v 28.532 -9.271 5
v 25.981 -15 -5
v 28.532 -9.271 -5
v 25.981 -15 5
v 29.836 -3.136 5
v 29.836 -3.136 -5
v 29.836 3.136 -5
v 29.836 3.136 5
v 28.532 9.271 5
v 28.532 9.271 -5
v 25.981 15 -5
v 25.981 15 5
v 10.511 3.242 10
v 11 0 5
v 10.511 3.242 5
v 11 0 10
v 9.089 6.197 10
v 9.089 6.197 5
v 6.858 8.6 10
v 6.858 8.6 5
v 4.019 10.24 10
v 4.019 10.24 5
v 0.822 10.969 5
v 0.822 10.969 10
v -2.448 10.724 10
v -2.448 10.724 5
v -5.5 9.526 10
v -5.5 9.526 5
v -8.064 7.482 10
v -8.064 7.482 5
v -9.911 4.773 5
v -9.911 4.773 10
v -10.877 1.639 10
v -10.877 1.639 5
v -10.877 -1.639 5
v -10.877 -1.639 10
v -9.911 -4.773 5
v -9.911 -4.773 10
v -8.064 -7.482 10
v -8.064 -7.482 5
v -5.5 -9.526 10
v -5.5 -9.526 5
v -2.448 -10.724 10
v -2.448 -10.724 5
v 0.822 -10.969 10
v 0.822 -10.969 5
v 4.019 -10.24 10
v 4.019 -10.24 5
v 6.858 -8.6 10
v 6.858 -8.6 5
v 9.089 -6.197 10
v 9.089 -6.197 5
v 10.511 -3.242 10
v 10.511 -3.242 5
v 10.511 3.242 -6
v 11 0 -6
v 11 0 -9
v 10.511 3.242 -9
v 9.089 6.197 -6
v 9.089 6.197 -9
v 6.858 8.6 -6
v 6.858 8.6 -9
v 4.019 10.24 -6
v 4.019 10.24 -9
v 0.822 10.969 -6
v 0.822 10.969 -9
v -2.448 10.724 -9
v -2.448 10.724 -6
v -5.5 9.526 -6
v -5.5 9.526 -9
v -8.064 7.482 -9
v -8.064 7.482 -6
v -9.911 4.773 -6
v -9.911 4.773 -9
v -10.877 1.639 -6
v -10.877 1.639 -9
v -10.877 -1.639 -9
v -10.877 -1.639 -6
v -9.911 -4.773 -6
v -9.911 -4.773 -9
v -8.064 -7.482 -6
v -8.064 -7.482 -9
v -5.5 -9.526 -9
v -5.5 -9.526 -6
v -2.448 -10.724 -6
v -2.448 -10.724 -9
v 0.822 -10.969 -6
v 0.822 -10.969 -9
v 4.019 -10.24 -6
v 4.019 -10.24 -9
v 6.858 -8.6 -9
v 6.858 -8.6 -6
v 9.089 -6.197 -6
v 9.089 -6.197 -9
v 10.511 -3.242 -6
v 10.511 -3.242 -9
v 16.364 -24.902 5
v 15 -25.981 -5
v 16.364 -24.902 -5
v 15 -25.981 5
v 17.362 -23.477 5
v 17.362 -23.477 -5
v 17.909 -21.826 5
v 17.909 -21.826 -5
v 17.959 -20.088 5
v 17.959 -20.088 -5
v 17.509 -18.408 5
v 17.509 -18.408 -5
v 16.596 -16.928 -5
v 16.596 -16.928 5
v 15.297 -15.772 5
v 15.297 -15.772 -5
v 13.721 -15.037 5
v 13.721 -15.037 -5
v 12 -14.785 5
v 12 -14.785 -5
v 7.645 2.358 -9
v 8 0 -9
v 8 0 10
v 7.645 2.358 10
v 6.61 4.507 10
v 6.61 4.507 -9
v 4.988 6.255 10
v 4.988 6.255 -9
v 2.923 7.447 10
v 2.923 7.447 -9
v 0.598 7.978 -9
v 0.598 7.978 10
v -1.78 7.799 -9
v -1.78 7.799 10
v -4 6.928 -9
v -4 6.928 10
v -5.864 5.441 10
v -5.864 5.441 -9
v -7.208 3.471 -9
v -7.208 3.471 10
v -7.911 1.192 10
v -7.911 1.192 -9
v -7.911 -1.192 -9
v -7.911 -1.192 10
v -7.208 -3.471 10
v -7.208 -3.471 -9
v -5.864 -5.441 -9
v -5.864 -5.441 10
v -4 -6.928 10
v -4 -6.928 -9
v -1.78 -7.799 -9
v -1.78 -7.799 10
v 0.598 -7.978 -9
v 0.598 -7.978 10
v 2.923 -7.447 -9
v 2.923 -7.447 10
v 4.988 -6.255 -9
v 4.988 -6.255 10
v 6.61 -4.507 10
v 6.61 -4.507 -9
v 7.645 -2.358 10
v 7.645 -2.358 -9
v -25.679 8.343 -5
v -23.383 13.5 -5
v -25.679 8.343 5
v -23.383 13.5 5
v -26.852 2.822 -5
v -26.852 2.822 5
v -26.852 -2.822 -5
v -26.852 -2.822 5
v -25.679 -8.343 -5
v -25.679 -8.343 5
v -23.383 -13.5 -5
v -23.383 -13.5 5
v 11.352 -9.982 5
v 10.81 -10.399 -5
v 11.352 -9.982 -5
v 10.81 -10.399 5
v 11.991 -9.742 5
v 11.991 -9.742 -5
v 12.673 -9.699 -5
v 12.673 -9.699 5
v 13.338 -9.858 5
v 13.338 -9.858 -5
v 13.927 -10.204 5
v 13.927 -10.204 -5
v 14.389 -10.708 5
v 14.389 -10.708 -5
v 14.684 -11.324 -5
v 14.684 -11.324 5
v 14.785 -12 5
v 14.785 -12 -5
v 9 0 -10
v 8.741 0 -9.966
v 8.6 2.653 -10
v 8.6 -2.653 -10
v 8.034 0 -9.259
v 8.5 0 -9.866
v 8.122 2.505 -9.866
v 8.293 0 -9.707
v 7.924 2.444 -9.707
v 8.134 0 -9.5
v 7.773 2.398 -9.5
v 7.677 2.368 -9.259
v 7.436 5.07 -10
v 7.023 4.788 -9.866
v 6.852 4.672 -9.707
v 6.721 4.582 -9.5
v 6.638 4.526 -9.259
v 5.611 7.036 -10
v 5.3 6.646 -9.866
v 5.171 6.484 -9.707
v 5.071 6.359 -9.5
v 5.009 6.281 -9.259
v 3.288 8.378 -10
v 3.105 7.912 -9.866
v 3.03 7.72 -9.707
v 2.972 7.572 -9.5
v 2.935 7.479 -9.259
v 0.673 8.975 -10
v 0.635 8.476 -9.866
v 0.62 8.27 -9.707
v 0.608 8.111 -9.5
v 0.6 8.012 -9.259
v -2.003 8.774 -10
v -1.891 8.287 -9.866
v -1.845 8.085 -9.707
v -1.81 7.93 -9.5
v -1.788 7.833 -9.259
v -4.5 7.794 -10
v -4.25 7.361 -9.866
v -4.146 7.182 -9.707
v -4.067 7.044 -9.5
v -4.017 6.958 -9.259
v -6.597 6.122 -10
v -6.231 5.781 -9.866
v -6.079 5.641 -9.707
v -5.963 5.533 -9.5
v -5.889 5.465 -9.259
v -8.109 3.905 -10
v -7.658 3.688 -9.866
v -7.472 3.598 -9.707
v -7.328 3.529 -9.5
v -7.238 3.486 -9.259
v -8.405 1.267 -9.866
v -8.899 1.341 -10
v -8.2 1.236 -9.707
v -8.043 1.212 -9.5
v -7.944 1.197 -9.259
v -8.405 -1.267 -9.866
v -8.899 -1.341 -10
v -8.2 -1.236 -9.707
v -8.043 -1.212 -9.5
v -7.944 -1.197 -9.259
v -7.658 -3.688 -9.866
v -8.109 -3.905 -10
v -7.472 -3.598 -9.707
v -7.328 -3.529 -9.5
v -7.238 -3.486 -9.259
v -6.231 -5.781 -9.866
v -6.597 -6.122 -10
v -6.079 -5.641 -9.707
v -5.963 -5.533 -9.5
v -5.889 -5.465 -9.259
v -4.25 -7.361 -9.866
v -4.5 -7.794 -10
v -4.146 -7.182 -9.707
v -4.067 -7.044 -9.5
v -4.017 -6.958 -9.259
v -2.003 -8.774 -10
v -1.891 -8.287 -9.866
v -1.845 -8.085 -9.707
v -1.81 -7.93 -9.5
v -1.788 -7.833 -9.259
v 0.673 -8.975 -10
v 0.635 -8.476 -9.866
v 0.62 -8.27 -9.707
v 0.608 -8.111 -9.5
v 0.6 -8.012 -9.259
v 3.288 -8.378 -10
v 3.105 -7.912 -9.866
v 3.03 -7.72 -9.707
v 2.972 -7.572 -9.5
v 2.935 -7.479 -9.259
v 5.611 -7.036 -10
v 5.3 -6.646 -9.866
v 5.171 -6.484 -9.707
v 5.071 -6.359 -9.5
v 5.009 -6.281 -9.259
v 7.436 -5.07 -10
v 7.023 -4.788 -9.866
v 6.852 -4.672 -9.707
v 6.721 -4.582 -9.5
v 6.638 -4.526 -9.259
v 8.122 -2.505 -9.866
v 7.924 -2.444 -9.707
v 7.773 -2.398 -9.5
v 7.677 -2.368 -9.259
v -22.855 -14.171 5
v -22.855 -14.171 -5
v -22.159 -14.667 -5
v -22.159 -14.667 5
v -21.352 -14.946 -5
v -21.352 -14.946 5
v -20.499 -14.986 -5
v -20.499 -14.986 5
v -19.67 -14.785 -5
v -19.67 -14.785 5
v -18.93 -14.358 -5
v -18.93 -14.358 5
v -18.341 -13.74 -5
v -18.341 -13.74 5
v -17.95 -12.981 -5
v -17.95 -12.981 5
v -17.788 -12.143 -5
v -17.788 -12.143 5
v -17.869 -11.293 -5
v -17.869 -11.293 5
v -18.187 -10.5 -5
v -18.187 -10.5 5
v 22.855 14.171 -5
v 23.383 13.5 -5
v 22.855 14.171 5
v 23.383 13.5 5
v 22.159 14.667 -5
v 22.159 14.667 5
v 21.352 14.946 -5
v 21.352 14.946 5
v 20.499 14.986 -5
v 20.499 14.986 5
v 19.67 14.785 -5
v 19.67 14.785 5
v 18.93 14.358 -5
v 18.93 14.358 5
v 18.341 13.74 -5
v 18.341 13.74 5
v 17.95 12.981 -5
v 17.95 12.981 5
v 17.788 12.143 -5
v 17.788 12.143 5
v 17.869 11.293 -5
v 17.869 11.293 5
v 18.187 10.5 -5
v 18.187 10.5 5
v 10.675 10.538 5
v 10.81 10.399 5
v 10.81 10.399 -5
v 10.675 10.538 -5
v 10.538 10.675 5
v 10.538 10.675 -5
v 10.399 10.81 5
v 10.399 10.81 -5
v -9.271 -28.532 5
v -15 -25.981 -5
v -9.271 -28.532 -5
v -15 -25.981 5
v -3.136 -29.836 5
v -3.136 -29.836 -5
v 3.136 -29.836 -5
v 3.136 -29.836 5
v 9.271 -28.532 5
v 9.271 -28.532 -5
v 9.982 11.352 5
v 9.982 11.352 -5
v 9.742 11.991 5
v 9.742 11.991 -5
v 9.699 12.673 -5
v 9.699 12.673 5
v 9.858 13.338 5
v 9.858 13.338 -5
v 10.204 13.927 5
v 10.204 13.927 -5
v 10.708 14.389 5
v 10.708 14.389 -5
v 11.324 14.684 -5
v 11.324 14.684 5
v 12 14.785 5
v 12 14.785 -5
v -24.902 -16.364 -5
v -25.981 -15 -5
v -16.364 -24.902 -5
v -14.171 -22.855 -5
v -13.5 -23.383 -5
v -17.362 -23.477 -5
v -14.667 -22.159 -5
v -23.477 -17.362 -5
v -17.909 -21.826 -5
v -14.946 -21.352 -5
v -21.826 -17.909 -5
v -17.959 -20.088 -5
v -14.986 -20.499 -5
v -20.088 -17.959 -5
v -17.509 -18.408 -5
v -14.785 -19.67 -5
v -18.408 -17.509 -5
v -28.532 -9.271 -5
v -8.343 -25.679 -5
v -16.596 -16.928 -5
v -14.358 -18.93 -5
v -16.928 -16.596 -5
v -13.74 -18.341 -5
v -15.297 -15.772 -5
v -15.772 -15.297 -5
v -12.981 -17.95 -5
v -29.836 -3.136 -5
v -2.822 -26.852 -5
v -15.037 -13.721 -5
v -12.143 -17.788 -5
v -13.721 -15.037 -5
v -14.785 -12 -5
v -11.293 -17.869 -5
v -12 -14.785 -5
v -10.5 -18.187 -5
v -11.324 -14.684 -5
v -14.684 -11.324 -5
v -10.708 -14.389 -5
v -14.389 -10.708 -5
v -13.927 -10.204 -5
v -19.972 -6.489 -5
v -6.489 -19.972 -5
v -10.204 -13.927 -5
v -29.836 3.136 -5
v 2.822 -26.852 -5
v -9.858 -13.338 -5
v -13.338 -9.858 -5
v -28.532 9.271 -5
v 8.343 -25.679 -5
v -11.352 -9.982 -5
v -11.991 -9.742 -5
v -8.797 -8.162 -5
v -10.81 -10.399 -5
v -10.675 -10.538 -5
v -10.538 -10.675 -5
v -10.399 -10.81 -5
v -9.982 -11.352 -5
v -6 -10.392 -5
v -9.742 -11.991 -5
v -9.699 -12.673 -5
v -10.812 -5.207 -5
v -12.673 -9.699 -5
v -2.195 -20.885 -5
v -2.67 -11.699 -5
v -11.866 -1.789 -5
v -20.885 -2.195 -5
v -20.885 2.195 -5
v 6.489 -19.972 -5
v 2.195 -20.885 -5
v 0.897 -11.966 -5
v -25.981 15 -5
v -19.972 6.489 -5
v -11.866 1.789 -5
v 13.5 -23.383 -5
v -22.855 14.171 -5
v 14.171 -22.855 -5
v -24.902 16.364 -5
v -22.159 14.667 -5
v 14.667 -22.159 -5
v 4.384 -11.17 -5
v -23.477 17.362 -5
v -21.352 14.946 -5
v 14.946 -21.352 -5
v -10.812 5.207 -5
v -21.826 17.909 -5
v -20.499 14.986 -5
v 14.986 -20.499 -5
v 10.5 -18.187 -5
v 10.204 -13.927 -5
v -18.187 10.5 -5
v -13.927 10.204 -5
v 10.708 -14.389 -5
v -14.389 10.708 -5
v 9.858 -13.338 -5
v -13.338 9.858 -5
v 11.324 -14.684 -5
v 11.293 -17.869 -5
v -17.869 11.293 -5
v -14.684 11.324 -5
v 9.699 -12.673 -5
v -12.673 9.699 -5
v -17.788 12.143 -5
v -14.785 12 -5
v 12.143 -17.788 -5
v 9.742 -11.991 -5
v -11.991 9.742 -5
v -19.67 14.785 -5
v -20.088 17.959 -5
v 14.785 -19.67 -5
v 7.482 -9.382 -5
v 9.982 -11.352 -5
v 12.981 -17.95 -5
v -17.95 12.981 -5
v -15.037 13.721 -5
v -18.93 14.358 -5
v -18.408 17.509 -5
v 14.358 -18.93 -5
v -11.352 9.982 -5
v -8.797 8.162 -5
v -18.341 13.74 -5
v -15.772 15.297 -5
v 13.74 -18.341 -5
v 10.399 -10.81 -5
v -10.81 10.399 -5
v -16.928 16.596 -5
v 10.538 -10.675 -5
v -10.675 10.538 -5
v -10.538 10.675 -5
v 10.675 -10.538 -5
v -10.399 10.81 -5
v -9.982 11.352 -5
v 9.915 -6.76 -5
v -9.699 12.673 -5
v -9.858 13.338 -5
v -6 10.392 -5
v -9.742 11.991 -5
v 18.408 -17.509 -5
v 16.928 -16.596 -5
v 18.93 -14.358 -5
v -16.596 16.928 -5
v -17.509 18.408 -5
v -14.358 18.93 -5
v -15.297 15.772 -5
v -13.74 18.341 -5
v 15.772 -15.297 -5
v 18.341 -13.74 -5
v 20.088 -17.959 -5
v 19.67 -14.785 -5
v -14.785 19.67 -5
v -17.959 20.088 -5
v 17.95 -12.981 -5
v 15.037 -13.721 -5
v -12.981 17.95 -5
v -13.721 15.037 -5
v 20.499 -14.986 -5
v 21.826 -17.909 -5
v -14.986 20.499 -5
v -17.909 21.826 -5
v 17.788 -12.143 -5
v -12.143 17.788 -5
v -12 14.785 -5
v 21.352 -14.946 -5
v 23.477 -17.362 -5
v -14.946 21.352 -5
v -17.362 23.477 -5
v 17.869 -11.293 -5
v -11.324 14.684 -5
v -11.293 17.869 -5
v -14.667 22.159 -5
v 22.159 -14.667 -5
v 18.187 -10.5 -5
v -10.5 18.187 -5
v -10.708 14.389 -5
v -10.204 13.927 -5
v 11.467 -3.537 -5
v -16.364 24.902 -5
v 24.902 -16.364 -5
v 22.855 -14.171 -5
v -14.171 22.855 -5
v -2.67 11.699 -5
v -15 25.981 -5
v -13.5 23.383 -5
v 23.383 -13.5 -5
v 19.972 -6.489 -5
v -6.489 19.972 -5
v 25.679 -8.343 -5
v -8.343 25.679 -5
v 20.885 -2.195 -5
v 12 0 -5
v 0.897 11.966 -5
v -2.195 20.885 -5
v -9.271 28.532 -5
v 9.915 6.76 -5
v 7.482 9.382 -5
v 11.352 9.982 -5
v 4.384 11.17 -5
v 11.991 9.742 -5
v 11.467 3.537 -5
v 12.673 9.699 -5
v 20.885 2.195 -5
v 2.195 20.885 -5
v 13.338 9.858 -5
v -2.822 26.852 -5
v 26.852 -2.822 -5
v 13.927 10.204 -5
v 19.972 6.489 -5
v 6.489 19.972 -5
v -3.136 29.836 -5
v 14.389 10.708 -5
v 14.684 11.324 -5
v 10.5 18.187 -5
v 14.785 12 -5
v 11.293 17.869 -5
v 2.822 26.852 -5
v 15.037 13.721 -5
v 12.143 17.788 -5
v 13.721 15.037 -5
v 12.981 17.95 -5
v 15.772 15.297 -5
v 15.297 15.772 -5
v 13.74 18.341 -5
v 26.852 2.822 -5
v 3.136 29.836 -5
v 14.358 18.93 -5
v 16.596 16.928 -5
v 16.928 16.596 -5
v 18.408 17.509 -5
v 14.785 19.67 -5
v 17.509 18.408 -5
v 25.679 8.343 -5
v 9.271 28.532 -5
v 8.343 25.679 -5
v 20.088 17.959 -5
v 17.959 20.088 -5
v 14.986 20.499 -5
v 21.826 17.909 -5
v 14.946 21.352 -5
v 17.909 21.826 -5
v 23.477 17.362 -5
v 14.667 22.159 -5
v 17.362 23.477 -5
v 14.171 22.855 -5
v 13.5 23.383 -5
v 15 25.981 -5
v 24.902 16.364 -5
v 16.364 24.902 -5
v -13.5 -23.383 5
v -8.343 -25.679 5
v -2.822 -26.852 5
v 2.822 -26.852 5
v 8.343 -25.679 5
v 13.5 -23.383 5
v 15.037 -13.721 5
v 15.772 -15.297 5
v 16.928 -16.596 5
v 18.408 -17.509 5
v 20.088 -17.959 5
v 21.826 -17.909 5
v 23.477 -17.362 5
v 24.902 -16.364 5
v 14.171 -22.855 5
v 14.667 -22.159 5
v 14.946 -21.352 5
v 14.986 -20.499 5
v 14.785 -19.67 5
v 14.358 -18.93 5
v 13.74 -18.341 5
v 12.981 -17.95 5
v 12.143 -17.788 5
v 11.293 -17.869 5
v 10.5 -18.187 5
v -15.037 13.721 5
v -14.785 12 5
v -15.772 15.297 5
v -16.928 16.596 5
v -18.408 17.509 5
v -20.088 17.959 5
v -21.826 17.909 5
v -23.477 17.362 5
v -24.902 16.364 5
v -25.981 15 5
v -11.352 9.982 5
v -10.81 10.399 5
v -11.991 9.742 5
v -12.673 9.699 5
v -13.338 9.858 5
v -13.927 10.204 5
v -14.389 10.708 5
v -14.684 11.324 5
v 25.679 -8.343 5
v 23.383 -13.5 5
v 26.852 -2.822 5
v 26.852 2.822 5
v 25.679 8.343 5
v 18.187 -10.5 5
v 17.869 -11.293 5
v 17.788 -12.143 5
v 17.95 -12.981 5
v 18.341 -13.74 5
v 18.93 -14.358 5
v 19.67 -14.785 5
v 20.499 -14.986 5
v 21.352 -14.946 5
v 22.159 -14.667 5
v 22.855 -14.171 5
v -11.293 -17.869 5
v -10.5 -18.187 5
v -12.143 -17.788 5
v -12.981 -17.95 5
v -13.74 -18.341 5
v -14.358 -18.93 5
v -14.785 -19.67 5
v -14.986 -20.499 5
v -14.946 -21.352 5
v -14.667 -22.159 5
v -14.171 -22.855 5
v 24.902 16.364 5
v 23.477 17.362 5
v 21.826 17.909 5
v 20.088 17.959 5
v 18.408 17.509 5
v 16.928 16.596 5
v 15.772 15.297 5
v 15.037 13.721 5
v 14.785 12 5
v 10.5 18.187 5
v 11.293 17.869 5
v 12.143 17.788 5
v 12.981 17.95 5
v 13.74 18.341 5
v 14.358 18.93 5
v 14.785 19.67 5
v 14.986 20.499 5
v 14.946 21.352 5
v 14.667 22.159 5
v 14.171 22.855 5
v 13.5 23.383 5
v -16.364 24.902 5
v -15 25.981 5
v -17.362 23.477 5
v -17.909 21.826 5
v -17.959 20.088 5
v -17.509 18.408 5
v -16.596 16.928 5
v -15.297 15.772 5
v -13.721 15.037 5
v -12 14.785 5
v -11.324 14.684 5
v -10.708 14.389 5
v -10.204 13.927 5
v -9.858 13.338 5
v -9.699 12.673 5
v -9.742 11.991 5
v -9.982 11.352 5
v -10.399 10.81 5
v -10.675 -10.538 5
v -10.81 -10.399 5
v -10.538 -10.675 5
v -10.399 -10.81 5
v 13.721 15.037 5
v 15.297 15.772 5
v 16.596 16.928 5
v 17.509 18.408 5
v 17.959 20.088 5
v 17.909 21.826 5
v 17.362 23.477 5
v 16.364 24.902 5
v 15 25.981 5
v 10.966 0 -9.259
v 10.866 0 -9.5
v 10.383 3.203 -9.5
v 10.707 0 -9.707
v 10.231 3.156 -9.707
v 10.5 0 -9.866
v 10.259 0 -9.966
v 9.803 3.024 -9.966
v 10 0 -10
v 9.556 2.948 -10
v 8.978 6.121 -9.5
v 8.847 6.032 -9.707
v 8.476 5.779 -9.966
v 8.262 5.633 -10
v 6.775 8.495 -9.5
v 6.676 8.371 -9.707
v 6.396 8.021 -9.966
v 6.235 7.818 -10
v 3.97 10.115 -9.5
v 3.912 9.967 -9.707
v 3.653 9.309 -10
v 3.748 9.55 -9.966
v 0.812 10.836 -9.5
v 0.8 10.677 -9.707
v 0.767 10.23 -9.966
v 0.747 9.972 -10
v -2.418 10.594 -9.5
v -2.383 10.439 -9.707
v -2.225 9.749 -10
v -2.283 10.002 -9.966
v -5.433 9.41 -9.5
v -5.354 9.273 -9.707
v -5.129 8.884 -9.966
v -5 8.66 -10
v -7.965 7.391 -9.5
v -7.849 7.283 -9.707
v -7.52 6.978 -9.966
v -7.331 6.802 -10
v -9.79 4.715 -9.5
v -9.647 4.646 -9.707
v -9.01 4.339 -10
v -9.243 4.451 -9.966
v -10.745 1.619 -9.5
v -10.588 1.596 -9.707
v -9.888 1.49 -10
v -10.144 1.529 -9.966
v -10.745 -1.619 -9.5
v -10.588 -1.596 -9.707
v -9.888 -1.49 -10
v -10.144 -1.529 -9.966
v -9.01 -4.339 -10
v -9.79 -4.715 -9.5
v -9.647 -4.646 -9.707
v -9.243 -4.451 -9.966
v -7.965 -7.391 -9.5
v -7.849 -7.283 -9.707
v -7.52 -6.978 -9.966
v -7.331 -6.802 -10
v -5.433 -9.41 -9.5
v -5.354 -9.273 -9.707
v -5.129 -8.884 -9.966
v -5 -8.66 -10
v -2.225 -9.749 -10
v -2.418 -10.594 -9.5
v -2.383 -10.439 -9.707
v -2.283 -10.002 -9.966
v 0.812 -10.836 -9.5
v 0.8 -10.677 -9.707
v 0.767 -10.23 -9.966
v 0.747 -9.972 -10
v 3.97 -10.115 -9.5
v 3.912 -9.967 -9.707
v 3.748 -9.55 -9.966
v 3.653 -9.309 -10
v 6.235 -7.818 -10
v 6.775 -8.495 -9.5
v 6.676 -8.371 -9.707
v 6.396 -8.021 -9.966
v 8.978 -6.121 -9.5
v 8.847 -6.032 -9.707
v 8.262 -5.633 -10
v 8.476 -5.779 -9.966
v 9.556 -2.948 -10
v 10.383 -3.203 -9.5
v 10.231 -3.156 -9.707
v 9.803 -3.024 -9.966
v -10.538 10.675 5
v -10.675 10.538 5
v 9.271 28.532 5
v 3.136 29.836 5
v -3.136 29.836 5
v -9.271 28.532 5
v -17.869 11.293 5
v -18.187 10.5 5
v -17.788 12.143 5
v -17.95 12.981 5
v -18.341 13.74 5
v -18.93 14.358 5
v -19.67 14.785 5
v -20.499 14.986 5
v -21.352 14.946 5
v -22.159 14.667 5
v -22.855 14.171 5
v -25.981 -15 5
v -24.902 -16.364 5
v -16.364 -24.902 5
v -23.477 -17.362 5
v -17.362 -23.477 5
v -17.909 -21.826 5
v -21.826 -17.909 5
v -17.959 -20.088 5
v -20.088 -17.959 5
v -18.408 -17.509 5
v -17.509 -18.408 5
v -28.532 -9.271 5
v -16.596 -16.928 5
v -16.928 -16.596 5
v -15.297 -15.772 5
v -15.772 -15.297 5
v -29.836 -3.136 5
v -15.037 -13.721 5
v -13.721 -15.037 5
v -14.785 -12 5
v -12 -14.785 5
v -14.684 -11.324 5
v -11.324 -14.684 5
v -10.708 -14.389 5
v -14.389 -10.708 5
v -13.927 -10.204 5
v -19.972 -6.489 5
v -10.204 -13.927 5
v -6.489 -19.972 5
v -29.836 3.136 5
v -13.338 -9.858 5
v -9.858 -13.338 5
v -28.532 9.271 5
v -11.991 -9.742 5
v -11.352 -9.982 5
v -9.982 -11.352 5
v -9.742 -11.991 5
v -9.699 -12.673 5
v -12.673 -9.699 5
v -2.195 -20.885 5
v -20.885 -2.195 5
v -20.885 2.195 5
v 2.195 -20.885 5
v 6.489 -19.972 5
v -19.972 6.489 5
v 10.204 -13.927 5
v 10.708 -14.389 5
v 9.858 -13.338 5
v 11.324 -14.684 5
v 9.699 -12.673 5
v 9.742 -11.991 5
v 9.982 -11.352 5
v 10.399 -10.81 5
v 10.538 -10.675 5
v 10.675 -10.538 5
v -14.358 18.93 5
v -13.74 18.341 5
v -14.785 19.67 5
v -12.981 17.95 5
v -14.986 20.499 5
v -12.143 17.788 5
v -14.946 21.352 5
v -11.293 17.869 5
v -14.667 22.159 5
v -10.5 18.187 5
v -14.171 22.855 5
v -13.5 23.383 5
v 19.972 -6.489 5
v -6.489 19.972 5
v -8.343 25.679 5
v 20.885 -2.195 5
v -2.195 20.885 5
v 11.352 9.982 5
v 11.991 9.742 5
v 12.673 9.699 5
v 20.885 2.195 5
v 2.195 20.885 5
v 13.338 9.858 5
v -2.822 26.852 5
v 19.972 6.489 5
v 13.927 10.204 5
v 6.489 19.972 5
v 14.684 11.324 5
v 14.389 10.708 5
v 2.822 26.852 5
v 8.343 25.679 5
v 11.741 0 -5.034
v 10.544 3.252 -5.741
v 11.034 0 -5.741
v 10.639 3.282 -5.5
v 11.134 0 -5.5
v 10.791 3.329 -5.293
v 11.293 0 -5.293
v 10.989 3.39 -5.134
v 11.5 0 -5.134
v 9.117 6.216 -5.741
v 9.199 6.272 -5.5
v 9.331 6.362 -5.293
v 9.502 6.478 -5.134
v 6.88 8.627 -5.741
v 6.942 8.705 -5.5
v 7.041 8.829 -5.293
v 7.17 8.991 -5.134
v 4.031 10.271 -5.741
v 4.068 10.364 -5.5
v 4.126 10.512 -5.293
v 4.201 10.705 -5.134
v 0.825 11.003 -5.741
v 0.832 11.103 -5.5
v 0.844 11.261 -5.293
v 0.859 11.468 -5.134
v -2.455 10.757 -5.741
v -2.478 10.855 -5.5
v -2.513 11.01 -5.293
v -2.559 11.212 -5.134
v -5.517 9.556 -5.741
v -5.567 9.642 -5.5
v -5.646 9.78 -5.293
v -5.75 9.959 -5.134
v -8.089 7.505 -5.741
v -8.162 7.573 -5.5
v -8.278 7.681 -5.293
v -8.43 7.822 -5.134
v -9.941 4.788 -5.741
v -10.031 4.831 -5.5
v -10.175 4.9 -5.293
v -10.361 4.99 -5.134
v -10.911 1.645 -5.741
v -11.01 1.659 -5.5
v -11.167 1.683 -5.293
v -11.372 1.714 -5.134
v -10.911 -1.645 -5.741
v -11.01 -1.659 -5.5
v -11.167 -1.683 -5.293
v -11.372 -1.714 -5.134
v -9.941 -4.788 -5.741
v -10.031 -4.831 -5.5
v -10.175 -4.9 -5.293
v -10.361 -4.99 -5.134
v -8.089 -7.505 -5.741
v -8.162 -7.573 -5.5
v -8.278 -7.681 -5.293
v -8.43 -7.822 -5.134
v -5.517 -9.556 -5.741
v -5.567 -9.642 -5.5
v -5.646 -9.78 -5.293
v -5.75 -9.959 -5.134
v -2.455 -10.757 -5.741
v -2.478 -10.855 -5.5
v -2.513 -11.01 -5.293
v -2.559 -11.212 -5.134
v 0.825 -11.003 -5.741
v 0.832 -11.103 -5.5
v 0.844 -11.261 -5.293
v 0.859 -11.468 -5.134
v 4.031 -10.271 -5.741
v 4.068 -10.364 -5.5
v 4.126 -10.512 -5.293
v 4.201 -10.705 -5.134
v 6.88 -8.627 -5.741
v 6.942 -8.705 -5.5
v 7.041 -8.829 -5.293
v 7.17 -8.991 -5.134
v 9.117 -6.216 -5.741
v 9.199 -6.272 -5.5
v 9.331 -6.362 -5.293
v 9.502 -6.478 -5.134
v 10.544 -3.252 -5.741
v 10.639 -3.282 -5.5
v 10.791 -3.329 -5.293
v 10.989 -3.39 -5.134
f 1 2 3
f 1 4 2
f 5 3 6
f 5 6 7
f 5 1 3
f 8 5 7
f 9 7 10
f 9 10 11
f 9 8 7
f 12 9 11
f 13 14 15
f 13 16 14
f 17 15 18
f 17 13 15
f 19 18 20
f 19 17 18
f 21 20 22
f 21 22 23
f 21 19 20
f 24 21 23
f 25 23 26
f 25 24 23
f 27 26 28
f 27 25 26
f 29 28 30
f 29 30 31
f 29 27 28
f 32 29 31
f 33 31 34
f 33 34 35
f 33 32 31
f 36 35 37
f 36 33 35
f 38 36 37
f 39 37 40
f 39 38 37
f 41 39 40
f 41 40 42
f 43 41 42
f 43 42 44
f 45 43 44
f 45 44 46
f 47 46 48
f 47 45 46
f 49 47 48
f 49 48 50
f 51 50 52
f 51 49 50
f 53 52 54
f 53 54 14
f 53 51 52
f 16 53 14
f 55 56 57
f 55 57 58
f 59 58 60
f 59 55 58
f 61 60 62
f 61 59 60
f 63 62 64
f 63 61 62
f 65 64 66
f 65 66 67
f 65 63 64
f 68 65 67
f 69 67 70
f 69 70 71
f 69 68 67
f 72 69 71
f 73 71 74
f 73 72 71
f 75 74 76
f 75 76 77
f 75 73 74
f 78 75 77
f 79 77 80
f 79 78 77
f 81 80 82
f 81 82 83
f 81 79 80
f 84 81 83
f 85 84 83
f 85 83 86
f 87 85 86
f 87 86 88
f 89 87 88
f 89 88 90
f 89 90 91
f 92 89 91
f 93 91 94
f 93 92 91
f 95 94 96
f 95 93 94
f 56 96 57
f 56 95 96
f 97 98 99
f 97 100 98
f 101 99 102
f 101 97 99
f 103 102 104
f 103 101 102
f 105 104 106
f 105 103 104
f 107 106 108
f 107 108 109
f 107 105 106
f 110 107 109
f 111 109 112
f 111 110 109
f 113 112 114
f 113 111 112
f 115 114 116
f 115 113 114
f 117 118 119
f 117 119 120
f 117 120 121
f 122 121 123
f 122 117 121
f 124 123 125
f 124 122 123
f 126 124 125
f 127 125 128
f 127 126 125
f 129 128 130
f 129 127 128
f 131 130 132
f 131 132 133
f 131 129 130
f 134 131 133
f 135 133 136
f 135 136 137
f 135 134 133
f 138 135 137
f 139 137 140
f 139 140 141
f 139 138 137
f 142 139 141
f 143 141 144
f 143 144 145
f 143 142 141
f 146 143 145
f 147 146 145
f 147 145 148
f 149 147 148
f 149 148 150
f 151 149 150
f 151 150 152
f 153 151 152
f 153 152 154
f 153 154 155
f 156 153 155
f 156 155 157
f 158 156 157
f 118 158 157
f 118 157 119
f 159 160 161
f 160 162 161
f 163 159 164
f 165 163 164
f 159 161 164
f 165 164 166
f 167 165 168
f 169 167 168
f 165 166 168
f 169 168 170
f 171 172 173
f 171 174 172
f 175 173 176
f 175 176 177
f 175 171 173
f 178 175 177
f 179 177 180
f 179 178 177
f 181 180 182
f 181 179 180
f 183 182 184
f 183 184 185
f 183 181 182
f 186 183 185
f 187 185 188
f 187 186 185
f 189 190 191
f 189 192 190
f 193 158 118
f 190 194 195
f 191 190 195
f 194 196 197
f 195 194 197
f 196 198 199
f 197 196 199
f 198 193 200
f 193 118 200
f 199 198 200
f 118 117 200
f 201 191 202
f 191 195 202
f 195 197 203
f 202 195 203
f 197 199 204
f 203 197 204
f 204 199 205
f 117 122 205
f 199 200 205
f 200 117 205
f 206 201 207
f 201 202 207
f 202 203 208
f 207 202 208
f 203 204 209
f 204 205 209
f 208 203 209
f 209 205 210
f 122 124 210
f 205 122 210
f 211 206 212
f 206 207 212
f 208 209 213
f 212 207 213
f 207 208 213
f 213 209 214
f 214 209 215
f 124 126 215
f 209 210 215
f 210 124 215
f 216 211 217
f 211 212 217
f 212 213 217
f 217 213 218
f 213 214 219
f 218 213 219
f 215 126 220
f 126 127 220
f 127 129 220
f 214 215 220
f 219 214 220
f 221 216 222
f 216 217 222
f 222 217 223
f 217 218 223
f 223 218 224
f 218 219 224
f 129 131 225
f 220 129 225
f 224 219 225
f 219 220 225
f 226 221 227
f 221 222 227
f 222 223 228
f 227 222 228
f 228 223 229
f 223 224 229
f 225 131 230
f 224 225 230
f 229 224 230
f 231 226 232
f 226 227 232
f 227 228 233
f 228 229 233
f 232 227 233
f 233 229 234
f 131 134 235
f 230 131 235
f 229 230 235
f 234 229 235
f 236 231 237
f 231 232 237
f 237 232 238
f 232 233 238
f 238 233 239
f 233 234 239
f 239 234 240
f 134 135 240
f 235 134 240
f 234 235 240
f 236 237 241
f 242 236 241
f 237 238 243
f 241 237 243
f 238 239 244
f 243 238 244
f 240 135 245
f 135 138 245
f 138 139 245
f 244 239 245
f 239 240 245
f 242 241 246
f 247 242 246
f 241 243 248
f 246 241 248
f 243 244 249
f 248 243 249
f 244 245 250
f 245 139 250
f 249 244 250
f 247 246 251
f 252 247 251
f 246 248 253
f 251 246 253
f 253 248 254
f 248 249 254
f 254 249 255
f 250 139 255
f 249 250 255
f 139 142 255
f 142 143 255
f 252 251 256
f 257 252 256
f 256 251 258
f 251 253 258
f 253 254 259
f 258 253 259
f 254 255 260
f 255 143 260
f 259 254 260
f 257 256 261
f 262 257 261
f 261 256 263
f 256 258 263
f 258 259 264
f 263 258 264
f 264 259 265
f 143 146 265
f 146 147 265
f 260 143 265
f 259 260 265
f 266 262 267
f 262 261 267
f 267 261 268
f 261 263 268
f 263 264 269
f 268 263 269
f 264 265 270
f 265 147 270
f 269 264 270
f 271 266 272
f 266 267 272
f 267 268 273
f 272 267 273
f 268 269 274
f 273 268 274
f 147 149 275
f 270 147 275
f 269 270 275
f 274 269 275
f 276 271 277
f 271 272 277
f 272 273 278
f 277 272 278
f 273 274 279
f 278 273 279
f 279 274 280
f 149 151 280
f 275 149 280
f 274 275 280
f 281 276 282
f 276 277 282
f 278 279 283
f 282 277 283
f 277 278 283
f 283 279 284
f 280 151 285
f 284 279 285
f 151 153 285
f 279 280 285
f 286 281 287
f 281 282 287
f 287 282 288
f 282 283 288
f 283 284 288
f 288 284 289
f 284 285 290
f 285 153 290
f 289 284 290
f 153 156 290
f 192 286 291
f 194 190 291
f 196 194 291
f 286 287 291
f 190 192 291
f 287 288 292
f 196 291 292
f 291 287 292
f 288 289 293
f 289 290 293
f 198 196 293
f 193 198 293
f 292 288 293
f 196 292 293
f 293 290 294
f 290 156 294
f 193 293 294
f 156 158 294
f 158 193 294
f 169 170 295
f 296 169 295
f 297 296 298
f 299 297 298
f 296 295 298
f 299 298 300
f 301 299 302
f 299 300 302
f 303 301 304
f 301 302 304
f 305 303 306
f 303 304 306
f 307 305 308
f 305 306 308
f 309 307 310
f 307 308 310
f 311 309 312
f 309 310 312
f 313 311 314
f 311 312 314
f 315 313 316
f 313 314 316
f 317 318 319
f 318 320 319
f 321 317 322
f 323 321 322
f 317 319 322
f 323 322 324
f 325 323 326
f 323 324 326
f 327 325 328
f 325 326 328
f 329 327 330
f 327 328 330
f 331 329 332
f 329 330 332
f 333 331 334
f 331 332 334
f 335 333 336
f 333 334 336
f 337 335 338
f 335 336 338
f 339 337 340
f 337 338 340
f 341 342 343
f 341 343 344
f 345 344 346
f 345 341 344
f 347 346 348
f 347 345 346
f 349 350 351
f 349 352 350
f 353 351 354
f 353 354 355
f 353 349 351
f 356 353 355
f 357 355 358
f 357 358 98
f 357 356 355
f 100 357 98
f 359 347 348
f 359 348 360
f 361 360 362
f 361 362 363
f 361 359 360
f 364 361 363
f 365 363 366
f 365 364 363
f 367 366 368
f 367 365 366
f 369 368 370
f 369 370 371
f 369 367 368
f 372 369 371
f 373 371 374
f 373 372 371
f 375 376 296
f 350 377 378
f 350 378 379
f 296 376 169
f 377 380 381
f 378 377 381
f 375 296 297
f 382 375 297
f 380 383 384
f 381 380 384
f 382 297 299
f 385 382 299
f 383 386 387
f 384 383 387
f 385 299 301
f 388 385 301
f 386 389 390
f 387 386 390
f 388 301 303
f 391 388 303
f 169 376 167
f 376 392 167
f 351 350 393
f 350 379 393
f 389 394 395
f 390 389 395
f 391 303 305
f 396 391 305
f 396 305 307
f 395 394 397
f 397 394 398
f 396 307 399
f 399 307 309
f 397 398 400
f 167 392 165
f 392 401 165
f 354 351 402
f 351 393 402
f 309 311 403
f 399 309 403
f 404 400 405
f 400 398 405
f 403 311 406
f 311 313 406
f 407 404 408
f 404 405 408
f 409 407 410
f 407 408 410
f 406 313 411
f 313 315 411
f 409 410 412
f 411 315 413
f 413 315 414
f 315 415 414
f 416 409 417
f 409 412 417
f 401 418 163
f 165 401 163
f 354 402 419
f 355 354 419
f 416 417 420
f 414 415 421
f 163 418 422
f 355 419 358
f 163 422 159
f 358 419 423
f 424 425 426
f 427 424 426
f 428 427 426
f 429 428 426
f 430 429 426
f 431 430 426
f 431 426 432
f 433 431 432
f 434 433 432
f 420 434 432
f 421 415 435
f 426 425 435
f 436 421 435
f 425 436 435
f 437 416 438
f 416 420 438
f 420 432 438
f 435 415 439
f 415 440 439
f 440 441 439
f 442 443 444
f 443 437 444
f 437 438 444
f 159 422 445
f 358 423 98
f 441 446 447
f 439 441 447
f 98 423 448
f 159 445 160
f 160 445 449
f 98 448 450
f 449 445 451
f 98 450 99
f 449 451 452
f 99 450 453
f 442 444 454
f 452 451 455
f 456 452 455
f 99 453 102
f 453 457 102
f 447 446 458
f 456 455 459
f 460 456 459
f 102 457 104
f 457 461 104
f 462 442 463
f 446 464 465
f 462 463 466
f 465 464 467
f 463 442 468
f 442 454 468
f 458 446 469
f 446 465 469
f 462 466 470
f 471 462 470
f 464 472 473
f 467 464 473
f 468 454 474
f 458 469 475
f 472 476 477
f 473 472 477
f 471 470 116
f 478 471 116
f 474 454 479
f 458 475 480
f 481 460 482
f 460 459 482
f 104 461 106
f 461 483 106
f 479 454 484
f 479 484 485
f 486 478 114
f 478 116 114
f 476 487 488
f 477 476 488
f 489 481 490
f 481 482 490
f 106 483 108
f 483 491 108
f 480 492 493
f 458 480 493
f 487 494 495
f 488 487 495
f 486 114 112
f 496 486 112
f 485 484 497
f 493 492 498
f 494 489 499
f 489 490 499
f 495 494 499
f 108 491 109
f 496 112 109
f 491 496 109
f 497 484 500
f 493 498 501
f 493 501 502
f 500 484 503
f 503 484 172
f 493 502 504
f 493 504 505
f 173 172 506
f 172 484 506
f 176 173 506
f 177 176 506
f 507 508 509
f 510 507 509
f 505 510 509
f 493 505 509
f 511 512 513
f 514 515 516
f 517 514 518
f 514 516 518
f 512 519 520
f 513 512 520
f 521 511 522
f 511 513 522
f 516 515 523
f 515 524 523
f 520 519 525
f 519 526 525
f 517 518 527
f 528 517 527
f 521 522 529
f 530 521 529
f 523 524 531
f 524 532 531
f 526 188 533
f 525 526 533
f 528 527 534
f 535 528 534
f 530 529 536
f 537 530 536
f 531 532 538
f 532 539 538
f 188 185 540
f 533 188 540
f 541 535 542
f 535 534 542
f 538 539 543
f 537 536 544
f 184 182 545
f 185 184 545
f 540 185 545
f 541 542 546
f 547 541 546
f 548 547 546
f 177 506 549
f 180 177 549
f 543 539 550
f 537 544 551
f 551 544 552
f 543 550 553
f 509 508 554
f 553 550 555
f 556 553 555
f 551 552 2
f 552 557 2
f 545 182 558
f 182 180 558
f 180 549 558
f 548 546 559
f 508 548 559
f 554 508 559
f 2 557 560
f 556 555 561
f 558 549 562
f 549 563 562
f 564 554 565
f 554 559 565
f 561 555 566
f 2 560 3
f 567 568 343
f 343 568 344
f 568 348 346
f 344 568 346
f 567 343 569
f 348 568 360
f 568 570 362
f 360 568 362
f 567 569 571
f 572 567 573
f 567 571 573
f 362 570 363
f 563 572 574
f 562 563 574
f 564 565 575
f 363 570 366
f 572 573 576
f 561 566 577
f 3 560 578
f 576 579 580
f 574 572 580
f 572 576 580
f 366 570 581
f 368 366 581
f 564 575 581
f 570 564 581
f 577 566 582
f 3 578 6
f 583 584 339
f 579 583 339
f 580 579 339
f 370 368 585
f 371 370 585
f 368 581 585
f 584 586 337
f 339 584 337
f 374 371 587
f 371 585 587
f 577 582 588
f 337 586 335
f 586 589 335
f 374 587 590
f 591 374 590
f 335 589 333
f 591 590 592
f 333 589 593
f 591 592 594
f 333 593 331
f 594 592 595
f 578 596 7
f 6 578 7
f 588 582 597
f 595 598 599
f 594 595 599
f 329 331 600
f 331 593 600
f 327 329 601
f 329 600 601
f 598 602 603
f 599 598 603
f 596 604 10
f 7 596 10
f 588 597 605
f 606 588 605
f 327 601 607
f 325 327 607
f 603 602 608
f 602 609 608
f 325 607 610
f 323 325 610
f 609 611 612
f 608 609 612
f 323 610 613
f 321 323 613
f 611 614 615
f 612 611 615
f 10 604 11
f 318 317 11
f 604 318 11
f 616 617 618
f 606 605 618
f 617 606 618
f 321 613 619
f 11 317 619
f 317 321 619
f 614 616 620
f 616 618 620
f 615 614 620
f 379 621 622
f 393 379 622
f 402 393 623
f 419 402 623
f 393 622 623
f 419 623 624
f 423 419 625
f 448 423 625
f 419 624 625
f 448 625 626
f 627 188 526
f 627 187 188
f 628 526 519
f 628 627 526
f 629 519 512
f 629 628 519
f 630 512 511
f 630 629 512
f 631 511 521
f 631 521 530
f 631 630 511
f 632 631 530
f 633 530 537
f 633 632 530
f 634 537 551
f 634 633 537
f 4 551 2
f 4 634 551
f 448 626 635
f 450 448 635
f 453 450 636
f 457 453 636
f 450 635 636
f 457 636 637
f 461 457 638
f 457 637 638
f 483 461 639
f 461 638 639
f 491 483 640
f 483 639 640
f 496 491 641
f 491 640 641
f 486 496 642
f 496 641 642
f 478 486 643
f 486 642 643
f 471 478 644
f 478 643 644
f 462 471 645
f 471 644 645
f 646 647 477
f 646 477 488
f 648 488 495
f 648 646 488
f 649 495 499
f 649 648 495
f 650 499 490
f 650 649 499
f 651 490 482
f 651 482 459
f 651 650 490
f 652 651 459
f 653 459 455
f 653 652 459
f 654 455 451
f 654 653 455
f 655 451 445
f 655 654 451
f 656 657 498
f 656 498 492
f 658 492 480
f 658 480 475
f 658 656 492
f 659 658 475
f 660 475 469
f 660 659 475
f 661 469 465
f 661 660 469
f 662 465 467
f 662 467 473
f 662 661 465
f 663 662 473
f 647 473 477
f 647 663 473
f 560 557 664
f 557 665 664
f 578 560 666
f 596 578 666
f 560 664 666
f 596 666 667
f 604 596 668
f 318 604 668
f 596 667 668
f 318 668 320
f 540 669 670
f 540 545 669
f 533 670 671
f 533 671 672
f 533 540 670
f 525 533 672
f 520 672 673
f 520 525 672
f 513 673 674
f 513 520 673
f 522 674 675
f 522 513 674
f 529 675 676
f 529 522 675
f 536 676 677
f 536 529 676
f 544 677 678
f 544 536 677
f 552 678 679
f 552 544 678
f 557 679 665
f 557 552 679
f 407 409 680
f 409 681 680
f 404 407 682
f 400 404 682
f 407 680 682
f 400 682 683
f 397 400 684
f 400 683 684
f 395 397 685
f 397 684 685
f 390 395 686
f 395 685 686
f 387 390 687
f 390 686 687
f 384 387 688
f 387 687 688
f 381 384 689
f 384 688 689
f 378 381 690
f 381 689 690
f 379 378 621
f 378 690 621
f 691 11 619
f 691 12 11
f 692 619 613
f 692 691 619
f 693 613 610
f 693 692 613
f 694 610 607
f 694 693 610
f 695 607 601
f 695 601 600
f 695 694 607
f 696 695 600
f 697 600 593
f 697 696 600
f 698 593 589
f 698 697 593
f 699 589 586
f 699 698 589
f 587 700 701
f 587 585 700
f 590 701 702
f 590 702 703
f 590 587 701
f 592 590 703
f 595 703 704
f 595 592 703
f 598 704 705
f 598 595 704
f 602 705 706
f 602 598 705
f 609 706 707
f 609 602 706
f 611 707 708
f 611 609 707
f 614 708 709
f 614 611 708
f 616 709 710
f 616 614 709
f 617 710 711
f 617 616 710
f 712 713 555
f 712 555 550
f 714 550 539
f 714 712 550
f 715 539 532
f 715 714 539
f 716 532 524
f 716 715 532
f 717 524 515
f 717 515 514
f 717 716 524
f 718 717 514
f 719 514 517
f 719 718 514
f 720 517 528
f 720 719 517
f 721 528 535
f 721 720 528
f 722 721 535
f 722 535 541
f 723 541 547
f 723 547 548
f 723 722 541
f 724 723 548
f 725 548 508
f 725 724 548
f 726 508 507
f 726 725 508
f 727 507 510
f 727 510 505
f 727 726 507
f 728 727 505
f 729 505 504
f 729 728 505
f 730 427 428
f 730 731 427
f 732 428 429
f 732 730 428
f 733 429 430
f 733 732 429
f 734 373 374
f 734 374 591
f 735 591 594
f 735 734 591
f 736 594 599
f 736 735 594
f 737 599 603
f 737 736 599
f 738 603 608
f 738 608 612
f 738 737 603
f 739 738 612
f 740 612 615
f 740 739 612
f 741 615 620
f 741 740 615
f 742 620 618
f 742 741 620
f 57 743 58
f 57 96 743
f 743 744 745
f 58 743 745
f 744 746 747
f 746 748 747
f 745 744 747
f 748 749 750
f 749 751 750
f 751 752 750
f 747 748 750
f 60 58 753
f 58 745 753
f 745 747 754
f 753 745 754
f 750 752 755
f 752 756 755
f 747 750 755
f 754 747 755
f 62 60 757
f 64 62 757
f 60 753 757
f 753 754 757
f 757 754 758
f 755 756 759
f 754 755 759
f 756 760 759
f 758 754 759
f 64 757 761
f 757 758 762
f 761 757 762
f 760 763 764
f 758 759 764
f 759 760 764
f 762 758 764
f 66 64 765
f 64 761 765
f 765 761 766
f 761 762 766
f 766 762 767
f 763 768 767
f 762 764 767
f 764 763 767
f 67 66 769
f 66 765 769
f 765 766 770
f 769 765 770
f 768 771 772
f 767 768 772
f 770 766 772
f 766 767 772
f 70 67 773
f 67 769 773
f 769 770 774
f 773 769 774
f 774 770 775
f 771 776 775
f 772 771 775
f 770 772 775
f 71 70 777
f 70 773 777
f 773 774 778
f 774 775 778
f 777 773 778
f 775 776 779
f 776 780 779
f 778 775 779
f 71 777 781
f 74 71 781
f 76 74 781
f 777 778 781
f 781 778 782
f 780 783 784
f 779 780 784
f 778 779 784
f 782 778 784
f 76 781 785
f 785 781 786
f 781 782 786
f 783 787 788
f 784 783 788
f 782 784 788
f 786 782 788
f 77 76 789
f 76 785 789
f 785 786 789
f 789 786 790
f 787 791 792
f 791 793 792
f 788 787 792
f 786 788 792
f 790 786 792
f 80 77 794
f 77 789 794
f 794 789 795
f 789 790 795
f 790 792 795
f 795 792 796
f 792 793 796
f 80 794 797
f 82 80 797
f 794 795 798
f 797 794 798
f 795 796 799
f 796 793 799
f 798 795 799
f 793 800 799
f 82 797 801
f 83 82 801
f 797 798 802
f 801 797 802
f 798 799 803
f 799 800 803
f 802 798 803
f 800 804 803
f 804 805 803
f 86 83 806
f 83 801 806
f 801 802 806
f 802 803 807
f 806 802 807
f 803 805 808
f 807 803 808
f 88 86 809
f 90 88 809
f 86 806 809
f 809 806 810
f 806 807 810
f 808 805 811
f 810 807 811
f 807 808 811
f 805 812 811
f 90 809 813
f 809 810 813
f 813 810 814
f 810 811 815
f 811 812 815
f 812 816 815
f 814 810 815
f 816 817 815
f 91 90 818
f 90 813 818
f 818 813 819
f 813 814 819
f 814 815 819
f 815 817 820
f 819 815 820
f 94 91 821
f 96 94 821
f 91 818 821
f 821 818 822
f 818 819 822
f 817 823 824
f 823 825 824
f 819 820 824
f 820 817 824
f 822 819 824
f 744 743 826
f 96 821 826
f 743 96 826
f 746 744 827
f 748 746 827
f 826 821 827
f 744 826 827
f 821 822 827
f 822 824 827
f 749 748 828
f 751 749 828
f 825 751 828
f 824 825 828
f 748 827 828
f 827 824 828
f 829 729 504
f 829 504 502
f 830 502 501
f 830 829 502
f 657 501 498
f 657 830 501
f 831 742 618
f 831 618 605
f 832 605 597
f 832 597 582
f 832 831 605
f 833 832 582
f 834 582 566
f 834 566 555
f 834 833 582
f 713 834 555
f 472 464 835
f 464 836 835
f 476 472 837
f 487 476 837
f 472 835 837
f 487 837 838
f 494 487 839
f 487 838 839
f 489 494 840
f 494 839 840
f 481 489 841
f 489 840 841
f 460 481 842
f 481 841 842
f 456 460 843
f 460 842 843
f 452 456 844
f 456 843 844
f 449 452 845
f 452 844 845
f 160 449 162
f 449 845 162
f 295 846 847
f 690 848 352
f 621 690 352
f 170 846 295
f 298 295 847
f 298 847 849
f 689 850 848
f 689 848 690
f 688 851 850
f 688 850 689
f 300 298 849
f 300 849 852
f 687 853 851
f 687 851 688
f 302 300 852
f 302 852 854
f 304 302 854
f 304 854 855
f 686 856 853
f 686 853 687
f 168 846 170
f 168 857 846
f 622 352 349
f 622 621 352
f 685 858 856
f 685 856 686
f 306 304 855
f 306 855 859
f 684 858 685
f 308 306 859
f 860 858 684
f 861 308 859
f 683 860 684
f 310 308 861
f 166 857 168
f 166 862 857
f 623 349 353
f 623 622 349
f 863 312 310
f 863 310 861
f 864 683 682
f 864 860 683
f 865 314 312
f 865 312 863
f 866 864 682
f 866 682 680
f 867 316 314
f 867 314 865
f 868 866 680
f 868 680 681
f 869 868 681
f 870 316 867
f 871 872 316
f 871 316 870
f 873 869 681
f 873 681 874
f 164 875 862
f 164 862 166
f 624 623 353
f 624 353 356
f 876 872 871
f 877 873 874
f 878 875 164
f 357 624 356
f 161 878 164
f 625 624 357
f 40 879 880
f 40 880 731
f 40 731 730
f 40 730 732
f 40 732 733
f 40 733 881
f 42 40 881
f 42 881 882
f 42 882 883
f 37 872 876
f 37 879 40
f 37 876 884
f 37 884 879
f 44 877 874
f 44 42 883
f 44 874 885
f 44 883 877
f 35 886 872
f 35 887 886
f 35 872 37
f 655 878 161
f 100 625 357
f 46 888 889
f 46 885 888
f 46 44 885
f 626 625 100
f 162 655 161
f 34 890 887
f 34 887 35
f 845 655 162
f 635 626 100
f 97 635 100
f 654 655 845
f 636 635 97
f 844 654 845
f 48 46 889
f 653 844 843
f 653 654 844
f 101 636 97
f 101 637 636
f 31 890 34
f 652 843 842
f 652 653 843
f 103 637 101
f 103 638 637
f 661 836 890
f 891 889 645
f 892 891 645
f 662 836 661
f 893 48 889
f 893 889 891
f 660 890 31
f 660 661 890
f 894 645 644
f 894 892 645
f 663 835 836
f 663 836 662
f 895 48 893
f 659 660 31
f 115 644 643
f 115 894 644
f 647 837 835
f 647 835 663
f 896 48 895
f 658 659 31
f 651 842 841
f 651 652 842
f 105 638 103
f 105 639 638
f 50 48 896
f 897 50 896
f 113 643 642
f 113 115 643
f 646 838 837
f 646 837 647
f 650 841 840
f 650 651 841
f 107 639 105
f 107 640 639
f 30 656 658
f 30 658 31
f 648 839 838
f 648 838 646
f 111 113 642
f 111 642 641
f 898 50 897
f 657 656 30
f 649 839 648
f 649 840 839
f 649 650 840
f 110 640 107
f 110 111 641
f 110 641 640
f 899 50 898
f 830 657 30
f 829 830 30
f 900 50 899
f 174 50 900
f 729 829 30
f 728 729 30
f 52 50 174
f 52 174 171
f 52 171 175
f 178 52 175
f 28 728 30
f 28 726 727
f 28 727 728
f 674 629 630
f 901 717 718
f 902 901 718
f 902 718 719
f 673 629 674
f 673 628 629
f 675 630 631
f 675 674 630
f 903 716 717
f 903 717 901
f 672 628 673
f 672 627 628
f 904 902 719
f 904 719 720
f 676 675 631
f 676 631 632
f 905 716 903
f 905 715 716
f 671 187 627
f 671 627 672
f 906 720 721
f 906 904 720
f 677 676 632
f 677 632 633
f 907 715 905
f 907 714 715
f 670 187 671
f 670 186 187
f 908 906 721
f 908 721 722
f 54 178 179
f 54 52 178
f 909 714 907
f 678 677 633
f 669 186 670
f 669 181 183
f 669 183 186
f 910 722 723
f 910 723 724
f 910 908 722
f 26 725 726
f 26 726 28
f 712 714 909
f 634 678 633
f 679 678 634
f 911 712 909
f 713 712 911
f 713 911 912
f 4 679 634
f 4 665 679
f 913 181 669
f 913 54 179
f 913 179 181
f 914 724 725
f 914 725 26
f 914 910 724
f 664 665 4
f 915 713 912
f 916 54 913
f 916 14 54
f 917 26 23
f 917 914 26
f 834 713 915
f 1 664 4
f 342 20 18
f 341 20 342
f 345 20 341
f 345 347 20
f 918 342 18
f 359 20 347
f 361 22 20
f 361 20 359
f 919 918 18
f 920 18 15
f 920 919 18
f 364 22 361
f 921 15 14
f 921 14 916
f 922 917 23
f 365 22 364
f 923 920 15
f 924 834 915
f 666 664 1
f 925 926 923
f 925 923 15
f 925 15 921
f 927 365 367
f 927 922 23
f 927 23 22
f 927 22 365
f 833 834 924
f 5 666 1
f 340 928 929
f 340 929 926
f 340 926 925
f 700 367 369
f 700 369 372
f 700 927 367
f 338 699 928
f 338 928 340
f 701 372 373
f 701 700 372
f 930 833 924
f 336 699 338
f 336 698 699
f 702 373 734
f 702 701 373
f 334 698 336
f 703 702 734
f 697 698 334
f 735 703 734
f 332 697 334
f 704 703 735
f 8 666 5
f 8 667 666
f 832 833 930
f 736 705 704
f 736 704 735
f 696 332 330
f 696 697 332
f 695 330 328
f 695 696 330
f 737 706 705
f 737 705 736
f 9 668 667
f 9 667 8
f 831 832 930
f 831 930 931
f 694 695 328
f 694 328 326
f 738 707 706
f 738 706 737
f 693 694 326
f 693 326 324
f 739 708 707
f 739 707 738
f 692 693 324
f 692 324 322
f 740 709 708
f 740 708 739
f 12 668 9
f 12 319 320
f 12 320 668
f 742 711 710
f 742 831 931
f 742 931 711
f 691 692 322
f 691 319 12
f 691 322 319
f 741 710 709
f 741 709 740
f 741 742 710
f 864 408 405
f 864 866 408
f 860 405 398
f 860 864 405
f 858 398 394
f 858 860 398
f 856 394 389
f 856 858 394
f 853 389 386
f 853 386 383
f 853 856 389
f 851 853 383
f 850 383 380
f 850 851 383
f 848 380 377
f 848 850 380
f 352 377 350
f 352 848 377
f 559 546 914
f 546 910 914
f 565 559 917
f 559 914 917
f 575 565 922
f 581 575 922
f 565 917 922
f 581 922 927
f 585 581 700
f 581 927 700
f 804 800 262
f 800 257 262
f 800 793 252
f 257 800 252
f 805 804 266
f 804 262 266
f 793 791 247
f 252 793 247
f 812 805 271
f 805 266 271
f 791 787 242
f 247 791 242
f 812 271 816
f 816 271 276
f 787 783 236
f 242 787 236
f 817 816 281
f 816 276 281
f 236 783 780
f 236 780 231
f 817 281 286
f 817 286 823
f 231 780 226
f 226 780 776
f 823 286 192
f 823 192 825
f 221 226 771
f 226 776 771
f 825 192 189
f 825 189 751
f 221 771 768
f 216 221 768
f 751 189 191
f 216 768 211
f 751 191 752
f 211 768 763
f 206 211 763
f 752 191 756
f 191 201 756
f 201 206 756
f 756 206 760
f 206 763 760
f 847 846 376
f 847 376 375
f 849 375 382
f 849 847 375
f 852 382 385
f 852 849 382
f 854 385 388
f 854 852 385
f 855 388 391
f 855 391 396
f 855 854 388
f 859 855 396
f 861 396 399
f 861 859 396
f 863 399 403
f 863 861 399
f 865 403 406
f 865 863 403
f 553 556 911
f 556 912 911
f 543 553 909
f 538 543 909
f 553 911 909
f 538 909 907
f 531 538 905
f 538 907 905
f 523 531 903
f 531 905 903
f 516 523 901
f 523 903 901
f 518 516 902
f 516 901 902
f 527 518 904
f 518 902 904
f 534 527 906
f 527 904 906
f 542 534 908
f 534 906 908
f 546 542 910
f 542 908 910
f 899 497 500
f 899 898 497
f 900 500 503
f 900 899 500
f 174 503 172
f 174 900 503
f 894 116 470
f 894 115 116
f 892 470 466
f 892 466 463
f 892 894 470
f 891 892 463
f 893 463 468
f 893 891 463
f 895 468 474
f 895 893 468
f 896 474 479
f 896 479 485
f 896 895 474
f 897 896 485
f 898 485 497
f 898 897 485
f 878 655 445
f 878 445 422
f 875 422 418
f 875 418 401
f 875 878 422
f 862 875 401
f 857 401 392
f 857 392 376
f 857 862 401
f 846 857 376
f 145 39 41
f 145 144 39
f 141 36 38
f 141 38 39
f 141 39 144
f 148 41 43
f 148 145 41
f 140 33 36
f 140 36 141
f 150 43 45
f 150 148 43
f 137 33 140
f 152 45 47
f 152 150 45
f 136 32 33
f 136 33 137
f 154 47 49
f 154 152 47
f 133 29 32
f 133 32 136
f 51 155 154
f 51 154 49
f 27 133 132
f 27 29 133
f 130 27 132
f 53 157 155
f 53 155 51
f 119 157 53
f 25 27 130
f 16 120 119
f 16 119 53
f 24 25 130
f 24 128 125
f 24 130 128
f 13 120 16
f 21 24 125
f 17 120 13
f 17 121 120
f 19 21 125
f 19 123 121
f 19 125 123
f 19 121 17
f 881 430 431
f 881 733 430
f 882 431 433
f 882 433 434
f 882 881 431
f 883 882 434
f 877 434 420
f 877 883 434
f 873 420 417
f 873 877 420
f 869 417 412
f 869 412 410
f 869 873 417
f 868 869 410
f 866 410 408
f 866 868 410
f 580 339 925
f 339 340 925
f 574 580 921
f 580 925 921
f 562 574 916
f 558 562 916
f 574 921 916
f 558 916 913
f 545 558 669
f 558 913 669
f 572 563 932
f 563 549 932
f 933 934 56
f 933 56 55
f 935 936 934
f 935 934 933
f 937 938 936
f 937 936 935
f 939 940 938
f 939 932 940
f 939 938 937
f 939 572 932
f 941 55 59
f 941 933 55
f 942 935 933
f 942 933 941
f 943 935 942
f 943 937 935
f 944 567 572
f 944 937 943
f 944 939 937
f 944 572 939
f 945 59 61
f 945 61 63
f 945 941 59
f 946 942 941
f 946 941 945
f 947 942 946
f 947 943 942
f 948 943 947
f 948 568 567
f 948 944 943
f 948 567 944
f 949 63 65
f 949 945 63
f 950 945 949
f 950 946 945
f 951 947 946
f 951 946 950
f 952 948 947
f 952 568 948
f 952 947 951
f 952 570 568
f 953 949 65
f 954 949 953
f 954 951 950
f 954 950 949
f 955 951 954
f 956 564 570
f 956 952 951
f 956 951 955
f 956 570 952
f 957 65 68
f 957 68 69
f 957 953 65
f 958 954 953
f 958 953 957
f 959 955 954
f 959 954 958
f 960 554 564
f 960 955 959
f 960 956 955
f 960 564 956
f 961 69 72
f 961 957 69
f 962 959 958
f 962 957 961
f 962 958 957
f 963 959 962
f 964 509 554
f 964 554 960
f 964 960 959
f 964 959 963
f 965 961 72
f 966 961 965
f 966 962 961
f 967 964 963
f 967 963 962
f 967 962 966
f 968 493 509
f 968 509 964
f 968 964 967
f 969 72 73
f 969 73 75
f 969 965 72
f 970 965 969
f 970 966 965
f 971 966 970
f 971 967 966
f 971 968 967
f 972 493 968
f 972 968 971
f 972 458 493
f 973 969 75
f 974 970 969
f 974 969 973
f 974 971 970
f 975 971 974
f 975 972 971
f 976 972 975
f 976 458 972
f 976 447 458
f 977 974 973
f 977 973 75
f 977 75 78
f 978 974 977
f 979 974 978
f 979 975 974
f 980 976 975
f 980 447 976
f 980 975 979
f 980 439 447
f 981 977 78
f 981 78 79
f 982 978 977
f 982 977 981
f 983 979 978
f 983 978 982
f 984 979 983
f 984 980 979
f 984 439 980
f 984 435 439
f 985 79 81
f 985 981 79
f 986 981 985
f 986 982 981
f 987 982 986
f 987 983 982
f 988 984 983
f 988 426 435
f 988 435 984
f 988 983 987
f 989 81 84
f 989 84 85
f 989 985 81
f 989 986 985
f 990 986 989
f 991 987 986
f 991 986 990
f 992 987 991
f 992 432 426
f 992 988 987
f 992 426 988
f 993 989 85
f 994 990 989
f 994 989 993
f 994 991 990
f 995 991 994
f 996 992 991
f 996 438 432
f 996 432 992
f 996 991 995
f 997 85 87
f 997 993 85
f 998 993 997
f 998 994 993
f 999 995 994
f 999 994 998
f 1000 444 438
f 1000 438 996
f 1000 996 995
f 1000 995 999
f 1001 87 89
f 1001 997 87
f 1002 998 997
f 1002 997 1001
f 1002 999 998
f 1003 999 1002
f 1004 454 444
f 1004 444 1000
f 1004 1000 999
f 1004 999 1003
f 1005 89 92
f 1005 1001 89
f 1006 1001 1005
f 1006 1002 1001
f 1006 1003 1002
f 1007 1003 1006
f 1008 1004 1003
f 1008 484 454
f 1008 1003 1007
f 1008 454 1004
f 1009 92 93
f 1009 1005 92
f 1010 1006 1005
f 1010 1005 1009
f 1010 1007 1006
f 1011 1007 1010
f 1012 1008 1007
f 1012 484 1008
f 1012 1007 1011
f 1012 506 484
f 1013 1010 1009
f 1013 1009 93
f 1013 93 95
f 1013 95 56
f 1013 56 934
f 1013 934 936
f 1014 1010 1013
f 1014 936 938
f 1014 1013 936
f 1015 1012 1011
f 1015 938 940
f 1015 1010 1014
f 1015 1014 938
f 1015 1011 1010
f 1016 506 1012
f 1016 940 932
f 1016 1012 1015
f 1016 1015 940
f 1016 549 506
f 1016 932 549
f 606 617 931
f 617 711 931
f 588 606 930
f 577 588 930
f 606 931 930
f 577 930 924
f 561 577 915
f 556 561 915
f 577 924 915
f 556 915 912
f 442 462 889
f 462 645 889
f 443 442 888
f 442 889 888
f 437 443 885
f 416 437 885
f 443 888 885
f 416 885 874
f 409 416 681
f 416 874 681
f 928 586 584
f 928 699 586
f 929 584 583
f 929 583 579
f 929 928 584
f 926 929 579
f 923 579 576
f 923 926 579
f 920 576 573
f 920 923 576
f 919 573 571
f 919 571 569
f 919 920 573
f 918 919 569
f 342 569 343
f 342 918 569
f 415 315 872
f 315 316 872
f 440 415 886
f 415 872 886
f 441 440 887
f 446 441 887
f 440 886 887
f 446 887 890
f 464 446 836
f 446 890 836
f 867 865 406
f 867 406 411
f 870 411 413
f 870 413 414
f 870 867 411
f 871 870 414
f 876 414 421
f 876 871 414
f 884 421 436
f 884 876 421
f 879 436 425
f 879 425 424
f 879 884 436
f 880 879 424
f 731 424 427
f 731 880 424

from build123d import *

# Parameters (mm, degrees)
SKETCH1_R           = 11
SKETCH1_R_2         = 8
BOSS_EXTRUDE1_DEPTH = 10
SKETCH1_5_R         = 11
BOSS_EXTRUDE3_DEPTH = 5
FILLET2_R           = 1
FILLET3_R           = 1


with BuildPart() as part:
    # Sketch1 → Boss-Extrude1 (new, symmetric)
    with BuildSketch(Plane.XY):
        Circle(SKETCH1_R)
        Circle(SKETCH1_R_2, mode=Mode.SUBTRACT)
    extrude(amount=BOSS_EXTRUDE1_DEPTH, both=True)

    # Sketch1<5> → Boss-Extrude3 (add, symmetric)
    with BuildSketch(Plane.XY):
        with BuildLine():
            ThreePointArc((-12, 14.784609691), (-9.857677434, 13.338075004), (-10.398817362, 10.810393031))
            ThreePointArc((-10.398817362, 10.810393031), (-10.606601718, 10.606601718), (-10.810393031, 10.398817362))
            ThreePointArc((-10.810393031, 10.398817362), (-13.338075004, 9.857677434), (-14.784609691, 12))
            ThreePointArc((-14.784609691, 12), (-19.23169542, 17.795554958), (-25.980762114, 15))
            ThreePointArc((-25.980762114, 15), (-30, 0), (-25.980762114, -15))
            ThreePointArc((-25.980762114, -15), (-19.23169542, -17.795554958), (-14.784609691, -12))
            ThreePointArc((-14.784609691, -12), (-13.338075004, -9.857677434), (-10.810393031, -10.398817362))
            ThreePointArc((-10.810393031, -10.398817362), (-10.606601718, -10.606601718), (-10.398817362, -10.810393031))
            ThreePointArc((-10.398817362, -10.810393031), (-9.857677434, -13.338075004), (-12, -14.784609691))
            ThreePointArc((-12, -14.784609691), (-17.795554958, -19.23169542), (-15, -25.980762114))
            ThreePointArc((-15, -25.980762114), (0, -30), (15, -25.980762114))
            ThreePointArc((15, -25.980762114), (17.795554958, -19.23169542), (12, -14.784609691))
            ThreePointArc((12, -14.784609691), (9.857677434, -13.338075004), (10.398817362, -10.810393031))
            ThreePointArc((10.398817362, -10.810393031), (10.606601718, -10.606601718), (10.810393031, -10.398817362))
            ThreePointArc((10.810393031, -10.398817362), (13.338075004, -9.857677434), (14.784609691, -12))
            ThreePointArc((14.784609691, -12), (19.23169542, -17.795554958), (25.980762114, -15))
            ThreePointArc((25.980762114, -15), (30, 0), (25.980762114, 15))
            ThreePointArc((25.980762114, 15), (19.23169542, 17.795554958), (14.784609691, 12))
            ThreePointArc((14.784609691, 12), (13.338075004, 9.857677434), (10.810393031, 10.398817362))
            ThreePointArc((10.810393031, 10.398817362), (10.606601718, 10.606601718), (10.398817362, 10.810393031))
            ThreePointArc((10.398817362, 10.810393031), (9.857677434, 13.338075004), (12, 14.784609691))
            ThreePointArc((12, 14.784609691), (17.795554958, 19.23169542), (15, 25.980762114))
            ThreePointArc((15, 25.980762114), (0, 30), (-15, 25.980762114))
            ThreePointArc((-15, 25.980762114), (-17.795554958, 19.23169542), (-12, 14.784609691))
        make_face()
        with BuildLine():
            ThreePointArc((13.5, -23.382685902), (0, -27), (-13.5, -23.382685902))
            ThreePointArc((-13.5, -23.382685902), (-14.598076211, -19.284609691), (-10.5, -18.186533479))
            ThreePointArc((-10.5, -18.186533479), (0, -21), (10.5, -18.186533479))
            ThreePointArc((10.5, -18.186533479), (14.598076211, -19.284609691), (13.5, -23.382685902))
        make_face(mode=Mode.SUBTRACT)
        Circle(SKETCH1_5_R, mode=Mode.SUBTRACT)
        with BuildLine():
            ThreePointArc((23.382685902, 13.5), (27, 0), (23.382685902, -13.5))
            ThreePointArc((23.382685902, -13.5), (19.284609691, -14.598076211), (18.186533479, -10.5))
            ThreePointArc((18.186533479, -10.5), (21, 0), (18.186533479, 10.5))
            ThreePointArc((18.186533479, 10.5), (19.284609691, 14.598076211), (23.382685902, 13.5))
        make_face(mode=Mode.SUBTRACT)
        with BuildLine():
            ThreePointArc((-23.382685902, -13.5), (-27, 0), (-23.382685902, 13.5))
            ThreePointArc((-23.382685902, 13.5), (-19.284609691, 14.598076211), (-18.186533479, 10.5))
            ThreePointArc((-18.186533479, 10.5), (-21, 0), (-18.186533479, -10.5))
            ThreePointArc((-18.186533479, -10.5), (-19.284609691, -14.598076211), (-23.382685902, -13.5))
        make_face(mode=Mode.SUBTRACT)
        with BuildLine():
            ThreePointArc((-13.5, 23.382685902), (0, 27), (13.5, 23.382685902))
            ThreePointArc((13.5, 23.382685902), (14.598076211, 19.284609691), (10.5, 18.186533479))
            ThreePointArc((10.5, 18.186533479), (0, 21), (-10.5, 18.186533479))
            ThreePointArc((-10.5, 18.186533479), (-14.598076211, 19.284609691), (-13.5, 23.382685902))
        make_face(mode=Mode.SUBTRACT)
    extrude(amount=BOSS_EXTRUDE3_DEPTH, both=True)

    # Fillet2
    fillet2_edges = [part.edges().sort_by_distance(p)[0] for p in [
        (-8, 0, -10),
        (-11, 0, -10),
    ]]
    fillet(fillet2_edges, radius=FILLET2_R)

    # Fillet3
    fillet3_edges = [part.edges().sort_by_distance(p)[0] for p in [
        (-11, 0, -5),
    ]]
    fillet(fillet3_edges, radius=FILLET3_R)


solid = part.part
